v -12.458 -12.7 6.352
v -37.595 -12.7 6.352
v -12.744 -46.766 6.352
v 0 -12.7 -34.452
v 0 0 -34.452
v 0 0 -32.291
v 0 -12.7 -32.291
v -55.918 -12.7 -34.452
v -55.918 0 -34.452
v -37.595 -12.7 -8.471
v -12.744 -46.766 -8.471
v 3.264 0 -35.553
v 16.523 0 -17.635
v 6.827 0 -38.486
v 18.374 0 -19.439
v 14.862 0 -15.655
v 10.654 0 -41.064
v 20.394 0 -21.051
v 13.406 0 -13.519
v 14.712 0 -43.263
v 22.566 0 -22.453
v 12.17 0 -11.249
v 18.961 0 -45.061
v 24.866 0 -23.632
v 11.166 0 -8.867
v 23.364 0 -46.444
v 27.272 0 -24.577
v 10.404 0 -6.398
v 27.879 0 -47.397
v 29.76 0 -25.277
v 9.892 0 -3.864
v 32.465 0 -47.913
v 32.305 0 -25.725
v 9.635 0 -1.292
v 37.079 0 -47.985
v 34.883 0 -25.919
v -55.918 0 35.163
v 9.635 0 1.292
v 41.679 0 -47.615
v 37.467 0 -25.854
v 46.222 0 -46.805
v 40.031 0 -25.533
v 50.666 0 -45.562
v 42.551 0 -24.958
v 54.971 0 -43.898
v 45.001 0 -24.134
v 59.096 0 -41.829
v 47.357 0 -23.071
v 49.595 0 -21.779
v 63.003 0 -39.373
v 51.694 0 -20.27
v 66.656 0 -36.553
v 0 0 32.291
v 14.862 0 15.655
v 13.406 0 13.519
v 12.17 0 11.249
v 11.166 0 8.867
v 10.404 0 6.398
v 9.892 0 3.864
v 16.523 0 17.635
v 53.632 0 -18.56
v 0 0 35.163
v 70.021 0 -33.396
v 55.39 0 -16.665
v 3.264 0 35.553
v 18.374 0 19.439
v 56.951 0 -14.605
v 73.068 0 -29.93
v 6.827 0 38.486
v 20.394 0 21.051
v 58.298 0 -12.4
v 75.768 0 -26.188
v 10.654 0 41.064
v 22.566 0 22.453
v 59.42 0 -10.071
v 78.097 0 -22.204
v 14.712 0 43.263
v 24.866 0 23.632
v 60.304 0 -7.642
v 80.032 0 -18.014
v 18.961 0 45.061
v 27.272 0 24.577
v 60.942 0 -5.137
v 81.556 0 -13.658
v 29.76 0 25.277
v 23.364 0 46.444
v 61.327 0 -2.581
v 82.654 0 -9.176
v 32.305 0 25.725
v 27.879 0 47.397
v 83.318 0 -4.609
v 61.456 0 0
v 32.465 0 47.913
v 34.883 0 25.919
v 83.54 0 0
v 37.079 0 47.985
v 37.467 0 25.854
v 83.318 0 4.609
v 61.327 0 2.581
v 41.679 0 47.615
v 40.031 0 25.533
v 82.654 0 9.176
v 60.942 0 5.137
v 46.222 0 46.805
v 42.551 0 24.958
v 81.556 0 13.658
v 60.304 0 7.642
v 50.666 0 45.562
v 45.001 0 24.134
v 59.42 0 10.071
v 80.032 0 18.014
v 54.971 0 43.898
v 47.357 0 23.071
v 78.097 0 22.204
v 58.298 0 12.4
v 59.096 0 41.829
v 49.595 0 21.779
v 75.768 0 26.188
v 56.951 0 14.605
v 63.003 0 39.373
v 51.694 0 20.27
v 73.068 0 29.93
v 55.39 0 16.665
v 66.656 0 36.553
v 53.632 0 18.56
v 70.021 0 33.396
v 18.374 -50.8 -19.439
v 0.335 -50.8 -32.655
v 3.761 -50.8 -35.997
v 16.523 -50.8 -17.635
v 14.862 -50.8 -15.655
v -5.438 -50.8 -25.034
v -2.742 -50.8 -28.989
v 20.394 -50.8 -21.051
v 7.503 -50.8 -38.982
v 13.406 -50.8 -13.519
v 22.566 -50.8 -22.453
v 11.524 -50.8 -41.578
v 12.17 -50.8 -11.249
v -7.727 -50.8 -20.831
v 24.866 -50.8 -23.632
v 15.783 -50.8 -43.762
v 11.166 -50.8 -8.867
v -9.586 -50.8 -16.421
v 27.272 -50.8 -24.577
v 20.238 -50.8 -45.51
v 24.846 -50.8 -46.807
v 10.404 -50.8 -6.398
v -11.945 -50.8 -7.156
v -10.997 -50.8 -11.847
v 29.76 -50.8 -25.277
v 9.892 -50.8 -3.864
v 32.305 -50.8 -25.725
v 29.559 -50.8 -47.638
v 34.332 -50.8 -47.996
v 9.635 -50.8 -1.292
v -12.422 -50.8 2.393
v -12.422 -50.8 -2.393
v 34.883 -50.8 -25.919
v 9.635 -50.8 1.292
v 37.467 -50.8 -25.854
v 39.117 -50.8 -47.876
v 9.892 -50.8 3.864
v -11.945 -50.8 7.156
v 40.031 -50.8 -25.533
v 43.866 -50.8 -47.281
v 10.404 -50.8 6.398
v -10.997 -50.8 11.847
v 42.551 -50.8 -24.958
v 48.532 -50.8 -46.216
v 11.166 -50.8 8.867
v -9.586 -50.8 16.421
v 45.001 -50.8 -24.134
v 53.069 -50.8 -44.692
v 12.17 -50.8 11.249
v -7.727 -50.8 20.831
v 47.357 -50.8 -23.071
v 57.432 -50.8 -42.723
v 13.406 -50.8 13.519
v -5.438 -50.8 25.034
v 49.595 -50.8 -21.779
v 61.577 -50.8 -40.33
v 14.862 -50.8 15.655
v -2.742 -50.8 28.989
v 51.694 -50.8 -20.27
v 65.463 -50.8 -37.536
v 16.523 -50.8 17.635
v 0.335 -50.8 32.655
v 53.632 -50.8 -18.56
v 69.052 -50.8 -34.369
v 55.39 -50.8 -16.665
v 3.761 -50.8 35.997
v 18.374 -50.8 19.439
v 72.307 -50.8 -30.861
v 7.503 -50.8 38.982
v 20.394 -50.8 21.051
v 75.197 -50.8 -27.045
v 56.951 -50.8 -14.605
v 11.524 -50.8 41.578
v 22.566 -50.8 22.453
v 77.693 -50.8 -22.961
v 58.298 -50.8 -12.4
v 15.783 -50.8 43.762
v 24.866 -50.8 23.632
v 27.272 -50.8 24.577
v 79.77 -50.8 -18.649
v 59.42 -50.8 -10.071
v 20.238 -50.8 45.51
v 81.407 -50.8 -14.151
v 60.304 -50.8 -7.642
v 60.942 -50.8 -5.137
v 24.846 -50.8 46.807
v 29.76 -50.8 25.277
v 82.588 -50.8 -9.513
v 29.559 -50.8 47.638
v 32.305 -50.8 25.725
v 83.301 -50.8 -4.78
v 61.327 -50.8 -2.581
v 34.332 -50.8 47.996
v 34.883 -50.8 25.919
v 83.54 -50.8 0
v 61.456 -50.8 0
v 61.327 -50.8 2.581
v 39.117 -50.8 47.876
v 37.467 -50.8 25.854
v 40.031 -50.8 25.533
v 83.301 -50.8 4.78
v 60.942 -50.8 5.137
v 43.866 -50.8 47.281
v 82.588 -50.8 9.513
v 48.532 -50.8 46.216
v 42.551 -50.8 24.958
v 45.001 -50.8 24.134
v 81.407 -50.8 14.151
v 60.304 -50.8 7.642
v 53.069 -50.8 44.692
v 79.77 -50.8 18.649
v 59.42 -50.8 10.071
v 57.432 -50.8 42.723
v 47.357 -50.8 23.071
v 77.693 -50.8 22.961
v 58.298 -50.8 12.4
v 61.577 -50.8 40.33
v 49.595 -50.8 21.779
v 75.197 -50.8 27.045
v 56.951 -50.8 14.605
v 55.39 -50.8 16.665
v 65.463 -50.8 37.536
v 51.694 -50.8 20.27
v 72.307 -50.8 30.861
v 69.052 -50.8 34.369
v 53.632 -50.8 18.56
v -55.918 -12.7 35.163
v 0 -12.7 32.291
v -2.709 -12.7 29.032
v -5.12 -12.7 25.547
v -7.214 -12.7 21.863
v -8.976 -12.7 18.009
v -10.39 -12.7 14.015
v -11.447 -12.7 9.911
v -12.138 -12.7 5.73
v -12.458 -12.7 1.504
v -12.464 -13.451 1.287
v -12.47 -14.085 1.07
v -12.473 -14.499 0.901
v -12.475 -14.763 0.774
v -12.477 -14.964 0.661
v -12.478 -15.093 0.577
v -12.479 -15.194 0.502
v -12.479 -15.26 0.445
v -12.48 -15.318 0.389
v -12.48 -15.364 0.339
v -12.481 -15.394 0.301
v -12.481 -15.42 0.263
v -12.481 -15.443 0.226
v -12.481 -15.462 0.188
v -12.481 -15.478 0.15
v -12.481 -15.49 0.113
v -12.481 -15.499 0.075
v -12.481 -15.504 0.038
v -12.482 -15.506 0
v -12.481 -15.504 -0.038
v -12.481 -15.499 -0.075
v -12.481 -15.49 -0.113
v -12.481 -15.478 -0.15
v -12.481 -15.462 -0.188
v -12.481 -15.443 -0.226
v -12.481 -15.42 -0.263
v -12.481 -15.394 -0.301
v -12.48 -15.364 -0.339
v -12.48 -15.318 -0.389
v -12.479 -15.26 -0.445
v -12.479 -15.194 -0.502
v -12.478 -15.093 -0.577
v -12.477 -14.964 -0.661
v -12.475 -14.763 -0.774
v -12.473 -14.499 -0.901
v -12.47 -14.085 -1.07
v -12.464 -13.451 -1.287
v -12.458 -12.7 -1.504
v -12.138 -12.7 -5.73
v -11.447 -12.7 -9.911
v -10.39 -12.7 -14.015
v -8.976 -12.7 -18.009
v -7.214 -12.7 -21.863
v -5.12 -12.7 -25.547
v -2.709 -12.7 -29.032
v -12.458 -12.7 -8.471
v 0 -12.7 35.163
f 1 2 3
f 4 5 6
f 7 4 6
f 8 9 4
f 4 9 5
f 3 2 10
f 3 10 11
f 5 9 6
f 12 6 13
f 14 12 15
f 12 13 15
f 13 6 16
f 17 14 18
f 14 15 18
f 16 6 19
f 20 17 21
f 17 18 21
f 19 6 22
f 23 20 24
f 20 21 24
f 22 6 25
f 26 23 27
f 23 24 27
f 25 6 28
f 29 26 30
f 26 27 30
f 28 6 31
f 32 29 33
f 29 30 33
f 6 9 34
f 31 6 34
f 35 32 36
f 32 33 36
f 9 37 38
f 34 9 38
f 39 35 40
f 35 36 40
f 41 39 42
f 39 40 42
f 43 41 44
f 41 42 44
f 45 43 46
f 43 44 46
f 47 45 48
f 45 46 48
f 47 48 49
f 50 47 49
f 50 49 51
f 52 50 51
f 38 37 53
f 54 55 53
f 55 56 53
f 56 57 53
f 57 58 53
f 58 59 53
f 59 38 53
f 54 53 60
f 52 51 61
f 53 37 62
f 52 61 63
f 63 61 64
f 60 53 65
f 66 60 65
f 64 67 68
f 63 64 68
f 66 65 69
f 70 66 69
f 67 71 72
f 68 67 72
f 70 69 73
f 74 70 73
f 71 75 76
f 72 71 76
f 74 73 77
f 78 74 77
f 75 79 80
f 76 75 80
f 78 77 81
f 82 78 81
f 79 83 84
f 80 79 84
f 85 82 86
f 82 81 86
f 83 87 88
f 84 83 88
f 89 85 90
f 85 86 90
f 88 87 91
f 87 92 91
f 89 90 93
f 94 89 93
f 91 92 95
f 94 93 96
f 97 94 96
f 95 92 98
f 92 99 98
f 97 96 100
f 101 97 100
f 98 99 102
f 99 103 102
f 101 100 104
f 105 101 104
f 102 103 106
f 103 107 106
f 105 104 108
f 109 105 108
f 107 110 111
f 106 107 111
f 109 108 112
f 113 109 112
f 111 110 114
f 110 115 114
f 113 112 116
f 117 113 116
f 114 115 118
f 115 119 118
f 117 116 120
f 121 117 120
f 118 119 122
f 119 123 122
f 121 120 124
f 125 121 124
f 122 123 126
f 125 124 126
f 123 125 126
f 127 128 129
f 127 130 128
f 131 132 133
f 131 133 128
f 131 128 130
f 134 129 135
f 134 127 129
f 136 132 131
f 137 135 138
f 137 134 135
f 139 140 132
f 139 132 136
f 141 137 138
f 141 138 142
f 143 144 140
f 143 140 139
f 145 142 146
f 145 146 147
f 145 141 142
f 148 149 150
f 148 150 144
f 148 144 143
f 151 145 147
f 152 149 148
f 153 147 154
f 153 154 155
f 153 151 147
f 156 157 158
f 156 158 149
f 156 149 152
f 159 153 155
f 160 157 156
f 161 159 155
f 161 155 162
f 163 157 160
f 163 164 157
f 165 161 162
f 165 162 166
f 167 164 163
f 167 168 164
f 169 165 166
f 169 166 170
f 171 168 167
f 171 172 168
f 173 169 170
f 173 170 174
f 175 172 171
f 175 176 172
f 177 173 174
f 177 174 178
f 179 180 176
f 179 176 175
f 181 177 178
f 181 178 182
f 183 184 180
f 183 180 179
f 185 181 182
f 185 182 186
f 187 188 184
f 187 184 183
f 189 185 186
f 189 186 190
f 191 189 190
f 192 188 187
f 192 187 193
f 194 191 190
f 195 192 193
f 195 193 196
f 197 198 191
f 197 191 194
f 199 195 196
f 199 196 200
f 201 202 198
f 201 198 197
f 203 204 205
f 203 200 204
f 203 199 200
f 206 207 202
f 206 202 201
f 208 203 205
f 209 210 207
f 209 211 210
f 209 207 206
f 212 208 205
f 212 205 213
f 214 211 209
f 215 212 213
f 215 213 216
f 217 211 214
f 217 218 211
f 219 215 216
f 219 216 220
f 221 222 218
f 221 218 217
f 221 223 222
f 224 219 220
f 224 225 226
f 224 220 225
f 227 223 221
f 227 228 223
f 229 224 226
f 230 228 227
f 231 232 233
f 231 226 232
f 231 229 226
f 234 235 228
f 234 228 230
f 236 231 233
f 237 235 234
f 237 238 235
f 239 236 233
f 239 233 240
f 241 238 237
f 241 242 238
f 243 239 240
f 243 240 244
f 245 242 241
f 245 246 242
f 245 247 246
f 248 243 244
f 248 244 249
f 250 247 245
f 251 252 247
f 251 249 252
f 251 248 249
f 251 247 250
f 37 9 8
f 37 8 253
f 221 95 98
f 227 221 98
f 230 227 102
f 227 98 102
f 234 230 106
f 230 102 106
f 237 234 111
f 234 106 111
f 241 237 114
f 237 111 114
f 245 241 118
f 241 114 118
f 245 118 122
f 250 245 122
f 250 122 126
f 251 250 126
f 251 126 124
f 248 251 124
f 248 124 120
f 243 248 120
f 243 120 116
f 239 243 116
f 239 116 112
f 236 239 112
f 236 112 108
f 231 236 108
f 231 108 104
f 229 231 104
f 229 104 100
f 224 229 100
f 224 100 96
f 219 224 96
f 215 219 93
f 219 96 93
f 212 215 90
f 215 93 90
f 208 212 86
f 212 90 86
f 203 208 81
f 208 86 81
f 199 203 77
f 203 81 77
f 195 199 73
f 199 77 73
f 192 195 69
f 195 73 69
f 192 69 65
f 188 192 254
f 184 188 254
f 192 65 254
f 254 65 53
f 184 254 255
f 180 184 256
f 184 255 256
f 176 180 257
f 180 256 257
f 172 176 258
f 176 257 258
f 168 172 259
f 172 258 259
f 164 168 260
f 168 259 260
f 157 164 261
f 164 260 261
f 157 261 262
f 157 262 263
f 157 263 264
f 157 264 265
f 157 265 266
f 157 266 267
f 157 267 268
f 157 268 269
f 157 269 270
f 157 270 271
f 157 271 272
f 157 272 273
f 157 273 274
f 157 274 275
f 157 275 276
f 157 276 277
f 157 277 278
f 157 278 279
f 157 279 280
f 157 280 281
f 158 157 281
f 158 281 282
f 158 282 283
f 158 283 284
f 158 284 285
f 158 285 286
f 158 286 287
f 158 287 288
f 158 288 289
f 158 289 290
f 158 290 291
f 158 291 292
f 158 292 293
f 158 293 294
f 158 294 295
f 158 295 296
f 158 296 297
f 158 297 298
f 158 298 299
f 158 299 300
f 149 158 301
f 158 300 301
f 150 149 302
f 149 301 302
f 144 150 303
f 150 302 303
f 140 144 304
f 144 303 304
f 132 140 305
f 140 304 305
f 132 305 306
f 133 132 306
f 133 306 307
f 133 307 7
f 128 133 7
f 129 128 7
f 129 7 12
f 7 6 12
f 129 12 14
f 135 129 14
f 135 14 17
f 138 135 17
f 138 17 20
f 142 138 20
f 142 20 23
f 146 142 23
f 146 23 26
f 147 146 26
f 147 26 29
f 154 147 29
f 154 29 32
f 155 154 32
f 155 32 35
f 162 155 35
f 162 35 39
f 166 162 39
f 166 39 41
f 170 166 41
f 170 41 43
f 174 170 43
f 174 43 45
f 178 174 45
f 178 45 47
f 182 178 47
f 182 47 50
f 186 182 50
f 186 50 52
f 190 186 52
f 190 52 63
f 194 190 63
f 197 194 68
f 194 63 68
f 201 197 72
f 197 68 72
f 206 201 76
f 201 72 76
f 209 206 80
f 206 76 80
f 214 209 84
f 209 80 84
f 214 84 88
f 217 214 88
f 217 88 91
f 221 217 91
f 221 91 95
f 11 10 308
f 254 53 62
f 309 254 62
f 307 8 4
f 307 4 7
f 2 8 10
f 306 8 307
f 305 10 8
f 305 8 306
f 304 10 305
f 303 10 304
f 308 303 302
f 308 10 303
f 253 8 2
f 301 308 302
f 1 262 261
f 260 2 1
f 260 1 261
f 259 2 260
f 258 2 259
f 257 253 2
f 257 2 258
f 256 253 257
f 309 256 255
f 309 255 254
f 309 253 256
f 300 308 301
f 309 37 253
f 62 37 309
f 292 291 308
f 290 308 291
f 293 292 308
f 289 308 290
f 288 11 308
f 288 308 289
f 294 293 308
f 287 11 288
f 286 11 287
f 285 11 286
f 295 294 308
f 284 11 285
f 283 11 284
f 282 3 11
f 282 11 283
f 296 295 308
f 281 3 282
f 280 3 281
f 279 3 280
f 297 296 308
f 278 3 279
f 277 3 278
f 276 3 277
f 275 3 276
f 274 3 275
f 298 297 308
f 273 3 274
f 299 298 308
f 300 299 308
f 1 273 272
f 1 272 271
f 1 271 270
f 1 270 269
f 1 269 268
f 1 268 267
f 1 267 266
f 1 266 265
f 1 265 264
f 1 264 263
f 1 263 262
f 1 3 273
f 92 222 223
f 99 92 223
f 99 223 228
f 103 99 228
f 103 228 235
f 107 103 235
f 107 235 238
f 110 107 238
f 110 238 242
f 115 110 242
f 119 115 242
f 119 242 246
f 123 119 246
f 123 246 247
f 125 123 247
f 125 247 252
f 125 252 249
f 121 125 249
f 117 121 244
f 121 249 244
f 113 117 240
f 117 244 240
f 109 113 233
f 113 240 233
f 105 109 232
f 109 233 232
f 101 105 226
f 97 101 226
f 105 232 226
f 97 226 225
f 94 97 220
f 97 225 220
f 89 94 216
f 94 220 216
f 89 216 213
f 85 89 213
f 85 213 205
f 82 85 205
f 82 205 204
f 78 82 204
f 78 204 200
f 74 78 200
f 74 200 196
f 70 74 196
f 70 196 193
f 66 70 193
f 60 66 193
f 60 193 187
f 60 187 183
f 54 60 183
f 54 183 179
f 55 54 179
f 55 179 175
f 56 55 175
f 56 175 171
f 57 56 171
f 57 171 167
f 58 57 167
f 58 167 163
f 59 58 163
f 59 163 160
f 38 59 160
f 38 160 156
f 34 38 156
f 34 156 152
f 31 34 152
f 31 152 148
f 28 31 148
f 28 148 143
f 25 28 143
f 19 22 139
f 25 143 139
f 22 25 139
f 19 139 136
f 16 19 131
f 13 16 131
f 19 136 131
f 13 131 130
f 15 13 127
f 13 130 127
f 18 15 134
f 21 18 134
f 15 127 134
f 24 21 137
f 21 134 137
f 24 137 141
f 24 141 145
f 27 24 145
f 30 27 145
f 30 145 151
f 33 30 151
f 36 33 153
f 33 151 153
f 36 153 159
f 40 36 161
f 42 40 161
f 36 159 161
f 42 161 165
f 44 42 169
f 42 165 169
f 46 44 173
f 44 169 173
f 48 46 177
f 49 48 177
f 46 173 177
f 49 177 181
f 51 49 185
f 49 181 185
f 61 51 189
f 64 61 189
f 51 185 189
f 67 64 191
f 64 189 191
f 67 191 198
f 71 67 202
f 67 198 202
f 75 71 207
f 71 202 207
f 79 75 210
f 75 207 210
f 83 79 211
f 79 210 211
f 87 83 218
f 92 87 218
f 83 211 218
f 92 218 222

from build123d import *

# Parameters (mm, degrees)
F1_R          = 48.010514
F2_DEPTH      = 50.8
F0_W          = 55.918477
F0_H          = 69.615215
F5_DEPTH      = 12.7
F6_R          = 25.926633
F3_DEPTH      = 50.801
F4_DEPTH      = 6.352296
F4_DEPTH_BACK = 8.470742


with BuildPart() as f2:
    # F1 (on Front) → F2 (new body)
    with BuildSketch(Plane.XZ):
        with Locations((35.529003, 0)):
            Circle(F1_R)
    extrude(amount=F2_DEPTH)

    # F0 (on Front) → F5 (join)
    with BuildSketch(Plane.XZ):
        with Locations((-27.959238, 0.355854)):
            Rectangle(F0_W, F0_H)
    extrude(amount=F5_DEPTH)

    # F6 (on face) → F3 (cut, through all)
    with BuildSketch(Plane.XZ.offset(50.8)):
        with Locations((35.529003, 0)):
            Circle(F6_R)
    extrude(amount=-F3_DEPTH, mode=Mode.SUBTRACT)

    # F7 (on Top) → F4 (join, two sides)
    with BuildSketch(Plane.XY) as f4_sk:
        Polygon((-37.657067, -12.615045), (-12.744168, -46.766188), (-12.455202, -12.37454), align=None)
    extrude(amount=F4_DEPTH)
    extrude(f4_sk.sketch, amount=-F4_DEPTH_BACK)


solid = f2.part
